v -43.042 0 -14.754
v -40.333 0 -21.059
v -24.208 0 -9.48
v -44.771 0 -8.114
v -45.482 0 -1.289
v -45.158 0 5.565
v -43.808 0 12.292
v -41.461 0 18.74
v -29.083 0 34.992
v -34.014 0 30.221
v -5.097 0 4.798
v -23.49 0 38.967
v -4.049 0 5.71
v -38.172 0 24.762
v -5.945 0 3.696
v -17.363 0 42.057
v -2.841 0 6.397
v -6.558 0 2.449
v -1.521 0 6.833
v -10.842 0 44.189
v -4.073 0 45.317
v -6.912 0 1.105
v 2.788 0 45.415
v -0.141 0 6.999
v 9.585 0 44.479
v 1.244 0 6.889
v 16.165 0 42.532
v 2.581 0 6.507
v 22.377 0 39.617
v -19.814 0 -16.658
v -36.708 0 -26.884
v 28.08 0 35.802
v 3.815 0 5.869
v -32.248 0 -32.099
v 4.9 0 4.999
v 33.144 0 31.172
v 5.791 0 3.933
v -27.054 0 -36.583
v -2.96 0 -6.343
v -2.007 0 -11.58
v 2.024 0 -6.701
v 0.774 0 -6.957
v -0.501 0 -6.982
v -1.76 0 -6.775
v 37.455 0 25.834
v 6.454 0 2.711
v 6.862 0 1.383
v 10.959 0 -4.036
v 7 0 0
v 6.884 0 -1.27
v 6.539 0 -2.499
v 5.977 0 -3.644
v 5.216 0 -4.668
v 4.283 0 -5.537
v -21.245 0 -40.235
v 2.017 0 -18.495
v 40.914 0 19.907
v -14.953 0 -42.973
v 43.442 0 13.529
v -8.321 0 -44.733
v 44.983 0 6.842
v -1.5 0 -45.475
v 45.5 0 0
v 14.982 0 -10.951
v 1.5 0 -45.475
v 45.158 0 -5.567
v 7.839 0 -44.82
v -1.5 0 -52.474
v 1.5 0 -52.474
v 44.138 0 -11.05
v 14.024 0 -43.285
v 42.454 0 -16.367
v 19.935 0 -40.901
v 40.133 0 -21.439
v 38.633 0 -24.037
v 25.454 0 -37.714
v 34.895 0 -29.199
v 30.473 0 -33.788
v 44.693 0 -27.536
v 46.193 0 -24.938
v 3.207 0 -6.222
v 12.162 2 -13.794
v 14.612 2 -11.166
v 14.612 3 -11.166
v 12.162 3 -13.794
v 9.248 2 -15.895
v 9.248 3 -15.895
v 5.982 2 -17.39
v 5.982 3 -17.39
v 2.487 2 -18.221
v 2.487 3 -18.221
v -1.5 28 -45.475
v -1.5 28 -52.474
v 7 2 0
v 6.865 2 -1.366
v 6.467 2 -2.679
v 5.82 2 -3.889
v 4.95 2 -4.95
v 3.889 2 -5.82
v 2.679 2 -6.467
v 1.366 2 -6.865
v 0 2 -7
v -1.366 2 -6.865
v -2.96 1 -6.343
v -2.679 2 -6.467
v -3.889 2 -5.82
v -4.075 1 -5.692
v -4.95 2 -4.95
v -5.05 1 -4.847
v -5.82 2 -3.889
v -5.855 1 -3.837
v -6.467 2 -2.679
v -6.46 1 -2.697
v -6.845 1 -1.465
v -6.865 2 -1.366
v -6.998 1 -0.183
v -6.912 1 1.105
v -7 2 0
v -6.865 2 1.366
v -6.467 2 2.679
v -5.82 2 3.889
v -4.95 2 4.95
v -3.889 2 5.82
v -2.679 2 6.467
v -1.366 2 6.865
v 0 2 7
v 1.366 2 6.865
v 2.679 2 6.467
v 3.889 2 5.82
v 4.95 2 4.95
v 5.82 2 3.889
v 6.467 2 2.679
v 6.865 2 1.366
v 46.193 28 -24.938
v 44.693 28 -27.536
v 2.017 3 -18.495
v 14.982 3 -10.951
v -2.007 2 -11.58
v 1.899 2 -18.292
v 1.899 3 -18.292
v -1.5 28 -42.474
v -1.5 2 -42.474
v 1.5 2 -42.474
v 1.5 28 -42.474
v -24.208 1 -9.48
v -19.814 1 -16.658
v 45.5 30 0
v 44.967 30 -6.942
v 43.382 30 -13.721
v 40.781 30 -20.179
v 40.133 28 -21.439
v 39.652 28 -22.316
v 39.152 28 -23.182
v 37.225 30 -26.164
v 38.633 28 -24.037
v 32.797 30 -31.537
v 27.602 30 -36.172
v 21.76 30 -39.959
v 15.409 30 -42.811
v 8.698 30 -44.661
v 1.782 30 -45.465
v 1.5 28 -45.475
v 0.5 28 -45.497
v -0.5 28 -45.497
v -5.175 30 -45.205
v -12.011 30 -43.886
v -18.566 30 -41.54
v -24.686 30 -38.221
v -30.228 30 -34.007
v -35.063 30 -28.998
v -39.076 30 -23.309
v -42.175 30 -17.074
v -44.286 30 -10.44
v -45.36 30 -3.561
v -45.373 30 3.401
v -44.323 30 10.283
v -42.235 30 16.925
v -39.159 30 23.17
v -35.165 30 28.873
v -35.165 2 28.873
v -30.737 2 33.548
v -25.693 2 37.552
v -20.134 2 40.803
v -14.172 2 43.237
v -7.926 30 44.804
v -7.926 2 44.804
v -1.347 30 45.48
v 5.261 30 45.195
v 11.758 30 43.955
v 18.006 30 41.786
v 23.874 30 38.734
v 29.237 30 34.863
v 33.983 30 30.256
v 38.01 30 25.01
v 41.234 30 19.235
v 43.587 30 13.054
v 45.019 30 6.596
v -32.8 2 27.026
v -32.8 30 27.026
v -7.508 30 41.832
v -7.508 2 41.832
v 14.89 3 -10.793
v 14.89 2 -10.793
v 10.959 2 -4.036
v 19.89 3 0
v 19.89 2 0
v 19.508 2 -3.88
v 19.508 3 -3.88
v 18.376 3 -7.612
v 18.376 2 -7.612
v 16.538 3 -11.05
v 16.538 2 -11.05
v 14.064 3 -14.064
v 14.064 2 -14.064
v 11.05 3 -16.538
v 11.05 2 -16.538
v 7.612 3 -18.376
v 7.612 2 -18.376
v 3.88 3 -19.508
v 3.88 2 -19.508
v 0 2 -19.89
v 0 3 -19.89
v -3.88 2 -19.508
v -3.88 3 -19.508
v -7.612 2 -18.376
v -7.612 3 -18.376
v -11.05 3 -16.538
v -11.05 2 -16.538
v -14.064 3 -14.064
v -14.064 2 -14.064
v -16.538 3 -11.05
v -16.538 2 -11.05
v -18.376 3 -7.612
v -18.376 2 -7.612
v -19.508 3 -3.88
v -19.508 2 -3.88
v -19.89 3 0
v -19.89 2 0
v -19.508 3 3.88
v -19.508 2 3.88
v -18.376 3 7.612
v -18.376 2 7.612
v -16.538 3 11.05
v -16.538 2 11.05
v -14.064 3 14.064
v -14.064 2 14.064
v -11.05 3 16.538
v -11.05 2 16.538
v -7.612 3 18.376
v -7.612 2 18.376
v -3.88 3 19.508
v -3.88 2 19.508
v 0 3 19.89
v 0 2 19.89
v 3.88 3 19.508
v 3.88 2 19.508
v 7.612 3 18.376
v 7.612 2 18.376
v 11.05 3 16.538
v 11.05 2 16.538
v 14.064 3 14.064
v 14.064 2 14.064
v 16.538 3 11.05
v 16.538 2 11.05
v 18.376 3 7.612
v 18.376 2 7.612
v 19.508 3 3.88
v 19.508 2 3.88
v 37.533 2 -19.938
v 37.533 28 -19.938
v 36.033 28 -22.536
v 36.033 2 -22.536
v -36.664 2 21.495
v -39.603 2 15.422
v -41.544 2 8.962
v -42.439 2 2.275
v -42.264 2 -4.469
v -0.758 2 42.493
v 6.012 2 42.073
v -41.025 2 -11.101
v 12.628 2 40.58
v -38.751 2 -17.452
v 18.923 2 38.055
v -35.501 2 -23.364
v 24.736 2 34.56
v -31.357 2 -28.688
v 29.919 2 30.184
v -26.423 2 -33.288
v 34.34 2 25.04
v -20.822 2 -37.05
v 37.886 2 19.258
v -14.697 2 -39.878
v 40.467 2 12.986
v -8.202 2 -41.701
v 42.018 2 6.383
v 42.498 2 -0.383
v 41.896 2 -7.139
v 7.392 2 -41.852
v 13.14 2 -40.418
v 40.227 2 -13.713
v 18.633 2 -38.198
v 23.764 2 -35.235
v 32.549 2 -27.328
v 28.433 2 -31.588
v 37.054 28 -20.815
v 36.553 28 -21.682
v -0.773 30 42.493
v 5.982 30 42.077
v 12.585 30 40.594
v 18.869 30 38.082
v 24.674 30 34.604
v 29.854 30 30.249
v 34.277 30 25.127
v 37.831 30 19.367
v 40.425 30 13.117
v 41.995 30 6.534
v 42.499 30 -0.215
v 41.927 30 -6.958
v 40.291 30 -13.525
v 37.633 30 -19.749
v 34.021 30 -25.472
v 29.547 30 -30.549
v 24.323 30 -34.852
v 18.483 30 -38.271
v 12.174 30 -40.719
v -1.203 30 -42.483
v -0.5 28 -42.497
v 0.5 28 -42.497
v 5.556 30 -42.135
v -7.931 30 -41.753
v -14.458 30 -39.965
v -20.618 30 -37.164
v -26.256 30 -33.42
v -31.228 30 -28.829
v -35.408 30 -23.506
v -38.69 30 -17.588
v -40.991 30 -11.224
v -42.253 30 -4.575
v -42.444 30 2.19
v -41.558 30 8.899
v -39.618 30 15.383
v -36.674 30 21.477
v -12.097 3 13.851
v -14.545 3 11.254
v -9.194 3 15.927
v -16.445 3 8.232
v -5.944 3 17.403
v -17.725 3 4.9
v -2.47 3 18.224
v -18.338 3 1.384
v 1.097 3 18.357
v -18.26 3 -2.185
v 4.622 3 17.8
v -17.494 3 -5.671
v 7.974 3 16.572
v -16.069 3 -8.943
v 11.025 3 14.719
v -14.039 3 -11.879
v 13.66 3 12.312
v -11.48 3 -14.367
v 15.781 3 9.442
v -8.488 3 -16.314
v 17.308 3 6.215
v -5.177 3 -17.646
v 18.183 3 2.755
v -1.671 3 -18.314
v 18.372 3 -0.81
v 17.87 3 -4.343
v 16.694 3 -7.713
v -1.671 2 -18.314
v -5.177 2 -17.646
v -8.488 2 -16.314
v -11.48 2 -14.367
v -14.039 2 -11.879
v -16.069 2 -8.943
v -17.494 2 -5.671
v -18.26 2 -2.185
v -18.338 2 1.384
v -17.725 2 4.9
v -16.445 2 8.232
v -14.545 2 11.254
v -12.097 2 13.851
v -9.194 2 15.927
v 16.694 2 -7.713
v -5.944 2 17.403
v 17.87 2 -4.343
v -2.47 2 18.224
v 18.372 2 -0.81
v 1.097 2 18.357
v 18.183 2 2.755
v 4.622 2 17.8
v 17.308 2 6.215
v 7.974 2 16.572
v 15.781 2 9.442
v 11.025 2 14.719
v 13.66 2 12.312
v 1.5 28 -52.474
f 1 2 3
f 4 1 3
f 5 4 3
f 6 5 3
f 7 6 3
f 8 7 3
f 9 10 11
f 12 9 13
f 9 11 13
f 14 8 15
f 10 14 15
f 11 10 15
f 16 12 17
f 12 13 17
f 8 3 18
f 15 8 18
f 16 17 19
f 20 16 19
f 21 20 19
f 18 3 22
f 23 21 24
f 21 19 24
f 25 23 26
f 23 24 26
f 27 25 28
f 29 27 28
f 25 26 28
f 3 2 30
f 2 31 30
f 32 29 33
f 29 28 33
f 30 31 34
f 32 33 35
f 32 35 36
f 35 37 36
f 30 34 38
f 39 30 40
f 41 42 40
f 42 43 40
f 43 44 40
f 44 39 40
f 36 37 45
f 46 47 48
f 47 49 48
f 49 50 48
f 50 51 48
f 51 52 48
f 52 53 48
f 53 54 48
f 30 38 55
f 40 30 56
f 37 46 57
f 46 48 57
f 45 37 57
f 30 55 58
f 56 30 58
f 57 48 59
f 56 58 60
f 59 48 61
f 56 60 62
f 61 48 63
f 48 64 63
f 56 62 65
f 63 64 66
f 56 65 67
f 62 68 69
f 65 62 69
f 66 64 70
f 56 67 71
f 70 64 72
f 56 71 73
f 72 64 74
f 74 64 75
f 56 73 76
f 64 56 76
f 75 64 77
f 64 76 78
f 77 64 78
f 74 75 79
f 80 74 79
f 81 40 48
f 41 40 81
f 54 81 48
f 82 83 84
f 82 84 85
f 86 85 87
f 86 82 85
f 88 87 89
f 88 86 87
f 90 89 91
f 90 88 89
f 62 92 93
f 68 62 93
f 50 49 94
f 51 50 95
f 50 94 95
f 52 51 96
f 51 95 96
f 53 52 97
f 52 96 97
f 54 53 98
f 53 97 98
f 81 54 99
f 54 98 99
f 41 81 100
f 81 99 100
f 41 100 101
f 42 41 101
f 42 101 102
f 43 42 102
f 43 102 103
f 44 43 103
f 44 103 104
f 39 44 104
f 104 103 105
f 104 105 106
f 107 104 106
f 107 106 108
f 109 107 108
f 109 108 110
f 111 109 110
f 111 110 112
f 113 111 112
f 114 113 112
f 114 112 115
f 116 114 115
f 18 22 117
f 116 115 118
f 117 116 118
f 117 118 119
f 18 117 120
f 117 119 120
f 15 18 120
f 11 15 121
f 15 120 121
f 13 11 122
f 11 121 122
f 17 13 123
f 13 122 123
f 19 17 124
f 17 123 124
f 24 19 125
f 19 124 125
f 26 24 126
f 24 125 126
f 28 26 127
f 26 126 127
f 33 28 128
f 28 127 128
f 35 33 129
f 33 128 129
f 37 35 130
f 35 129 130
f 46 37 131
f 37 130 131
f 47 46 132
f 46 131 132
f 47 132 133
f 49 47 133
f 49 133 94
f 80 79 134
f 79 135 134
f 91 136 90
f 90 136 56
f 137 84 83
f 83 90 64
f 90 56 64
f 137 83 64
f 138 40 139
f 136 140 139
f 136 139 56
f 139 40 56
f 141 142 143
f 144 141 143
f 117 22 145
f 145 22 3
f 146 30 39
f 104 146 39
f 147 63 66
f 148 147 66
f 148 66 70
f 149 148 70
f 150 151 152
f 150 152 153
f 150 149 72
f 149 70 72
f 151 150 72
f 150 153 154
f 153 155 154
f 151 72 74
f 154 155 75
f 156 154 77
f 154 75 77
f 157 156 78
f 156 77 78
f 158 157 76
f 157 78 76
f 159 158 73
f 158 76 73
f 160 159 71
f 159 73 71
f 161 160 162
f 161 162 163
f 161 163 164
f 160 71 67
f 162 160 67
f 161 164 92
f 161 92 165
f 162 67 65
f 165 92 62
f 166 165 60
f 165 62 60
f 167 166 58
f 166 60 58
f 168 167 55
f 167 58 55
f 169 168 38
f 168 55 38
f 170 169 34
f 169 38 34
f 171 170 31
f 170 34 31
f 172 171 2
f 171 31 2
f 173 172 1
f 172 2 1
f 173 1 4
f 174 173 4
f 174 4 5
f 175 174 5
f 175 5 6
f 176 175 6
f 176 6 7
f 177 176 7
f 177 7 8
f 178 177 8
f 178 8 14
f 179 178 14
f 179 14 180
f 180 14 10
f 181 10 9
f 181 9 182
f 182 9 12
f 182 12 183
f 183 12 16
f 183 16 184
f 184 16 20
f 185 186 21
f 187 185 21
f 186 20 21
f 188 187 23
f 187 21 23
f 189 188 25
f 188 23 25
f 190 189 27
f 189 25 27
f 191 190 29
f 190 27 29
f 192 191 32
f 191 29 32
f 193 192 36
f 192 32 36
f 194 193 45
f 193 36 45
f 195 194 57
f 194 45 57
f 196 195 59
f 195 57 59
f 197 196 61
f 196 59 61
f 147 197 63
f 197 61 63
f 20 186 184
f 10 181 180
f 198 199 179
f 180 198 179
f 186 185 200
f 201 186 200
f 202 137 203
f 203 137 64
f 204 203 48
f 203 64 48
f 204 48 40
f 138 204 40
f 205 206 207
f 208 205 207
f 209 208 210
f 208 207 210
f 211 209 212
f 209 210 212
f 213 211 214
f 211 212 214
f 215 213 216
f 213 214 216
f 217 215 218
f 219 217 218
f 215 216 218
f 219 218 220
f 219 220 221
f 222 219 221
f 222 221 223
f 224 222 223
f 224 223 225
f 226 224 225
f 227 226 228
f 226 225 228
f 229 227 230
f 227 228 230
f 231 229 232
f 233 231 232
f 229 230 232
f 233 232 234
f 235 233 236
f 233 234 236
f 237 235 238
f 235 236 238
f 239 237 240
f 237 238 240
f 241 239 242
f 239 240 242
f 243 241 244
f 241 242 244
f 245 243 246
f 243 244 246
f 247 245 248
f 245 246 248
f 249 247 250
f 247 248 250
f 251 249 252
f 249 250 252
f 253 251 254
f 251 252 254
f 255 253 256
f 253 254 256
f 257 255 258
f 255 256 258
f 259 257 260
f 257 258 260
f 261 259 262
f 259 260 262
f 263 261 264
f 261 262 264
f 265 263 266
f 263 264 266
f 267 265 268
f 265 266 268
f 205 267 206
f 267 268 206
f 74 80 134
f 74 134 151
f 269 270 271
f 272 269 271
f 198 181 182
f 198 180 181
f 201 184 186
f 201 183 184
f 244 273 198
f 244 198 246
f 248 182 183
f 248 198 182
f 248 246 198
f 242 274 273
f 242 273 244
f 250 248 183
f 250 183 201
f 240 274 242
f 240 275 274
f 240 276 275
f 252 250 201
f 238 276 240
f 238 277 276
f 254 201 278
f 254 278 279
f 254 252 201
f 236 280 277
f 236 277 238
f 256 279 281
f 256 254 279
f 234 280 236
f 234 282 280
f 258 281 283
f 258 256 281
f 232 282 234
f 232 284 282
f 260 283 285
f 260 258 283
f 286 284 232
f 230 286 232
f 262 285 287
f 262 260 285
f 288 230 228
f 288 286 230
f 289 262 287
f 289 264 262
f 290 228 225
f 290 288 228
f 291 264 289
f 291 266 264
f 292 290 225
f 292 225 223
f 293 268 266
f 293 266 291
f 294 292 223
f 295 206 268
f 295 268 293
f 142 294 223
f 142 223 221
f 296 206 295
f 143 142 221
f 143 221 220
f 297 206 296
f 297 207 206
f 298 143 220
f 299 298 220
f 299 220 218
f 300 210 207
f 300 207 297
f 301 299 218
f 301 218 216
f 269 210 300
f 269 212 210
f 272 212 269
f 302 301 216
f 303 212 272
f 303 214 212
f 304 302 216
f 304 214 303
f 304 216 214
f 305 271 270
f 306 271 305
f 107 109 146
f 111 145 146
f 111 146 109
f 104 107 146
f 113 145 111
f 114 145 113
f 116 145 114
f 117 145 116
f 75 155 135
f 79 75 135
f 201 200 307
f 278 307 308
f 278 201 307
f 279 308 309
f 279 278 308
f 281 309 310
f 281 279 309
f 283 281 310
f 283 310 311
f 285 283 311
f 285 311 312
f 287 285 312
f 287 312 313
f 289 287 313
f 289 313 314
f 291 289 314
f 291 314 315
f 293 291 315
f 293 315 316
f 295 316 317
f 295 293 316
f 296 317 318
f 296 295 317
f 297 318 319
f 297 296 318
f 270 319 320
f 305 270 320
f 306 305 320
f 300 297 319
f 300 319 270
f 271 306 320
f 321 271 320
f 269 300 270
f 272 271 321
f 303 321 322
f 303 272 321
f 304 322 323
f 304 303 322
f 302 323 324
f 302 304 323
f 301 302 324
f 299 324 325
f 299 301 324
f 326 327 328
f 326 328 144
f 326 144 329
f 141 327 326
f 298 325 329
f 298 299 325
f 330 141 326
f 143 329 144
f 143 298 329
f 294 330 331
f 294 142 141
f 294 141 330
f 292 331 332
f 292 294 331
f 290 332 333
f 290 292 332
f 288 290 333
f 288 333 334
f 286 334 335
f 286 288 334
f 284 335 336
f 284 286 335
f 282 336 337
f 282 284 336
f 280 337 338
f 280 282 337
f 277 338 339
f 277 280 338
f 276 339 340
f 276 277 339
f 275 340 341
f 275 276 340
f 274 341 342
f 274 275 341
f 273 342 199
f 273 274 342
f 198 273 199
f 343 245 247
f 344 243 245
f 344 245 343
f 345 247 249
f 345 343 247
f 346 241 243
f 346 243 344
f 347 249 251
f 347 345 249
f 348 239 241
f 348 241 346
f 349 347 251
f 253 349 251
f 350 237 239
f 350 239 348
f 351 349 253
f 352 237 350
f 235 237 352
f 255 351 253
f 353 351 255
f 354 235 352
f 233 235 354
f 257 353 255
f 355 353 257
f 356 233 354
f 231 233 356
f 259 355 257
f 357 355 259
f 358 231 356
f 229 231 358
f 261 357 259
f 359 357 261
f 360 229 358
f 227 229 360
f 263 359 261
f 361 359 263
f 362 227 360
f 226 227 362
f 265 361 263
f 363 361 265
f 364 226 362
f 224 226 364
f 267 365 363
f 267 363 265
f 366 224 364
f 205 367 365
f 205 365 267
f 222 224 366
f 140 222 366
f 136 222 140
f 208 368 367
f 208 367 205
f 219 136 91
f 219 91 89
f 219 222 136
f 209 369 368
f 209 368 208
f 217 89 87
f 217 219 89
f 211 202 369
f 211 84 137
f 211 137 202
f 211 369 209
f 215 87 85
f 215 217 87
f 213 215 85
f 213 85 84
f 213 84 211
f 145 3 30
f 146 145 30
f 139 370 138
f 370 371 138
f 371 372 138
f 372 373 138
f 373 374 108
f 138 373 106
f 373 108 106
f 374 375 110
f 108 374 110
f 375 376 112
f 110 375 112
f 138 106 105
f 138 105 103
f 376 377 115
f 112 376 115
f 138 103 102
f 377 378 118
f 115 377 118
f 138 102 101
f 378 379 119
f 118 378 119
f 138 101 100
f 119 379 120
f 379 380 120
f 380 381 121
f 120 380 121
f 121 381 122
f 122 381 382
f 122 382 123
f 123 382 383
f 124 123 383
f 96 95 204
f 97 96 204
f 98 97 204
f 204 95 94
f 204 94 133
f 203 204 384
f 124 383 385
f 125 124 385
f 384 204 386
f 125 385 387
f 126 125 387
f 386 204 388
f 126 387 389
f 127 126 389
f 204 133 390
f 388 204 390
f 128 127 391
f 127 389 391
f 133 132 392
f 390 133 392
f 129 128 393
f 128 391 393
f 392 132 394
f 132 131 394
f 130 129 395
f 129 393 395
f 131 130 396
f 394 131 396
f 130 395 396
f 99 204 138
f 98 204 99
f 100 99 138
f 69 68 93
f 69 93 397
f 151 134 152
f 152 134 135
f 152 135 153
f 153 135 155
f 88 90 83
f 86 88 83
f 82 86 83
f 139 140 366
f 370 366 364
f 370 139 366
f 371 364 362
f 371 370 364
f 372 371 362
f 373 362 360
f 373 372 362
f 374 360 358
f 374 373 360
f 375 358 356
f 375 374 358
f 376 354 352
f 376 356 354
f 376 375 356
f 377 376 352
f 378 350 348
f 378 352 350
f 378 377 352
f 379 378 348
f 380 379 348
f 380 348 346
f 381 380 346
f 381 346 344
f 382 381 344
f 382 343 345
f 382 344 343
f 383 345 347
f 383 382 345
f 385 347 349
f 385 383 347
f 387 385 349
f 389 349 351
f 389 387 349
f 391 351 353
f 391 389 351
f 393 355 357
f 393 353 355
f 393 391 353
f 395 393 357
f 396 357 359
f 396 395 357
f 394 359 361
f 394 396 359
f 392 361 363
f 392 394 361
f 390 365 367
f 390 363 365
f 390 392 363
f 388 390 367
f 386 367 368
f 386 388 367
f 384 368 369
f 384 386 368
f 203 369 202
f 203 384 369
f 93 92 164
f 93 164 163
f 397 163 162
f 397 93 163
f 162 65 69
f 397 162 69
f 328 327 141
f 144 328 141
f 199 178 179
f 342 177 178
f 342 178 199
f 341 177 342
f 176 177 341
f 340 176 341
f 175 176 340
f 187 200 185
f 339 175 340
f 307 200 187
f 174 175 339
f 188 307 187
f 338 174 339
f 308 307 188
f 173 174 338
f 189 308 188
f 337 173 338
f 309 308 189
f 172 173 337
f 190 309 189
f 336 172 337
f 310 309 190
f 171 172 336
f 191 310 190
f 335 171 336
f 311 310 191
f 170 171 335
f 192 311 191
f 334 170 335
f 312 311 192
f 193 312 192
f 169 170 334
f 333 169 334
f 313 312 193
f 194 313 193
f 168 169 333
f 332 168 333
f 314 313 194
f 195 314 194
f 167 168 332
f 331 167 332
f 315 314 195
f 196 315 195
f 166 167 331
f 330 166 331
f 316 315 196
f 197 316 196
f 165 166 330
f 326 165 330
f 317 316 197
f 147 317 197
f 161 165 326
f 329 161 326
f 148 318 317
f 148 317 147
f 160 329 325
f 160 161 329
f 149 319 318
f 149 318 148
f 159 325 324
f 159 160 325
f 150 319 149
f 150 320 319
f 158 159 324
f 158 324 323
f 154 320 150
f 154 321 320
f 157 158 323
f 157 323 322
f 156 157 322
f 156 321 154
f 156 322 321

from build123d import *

# Parameters (mm, degrees)
SKETCH1_R                = 45.5
SKETCH1_R_2              = 42.5
BOSS_EXTRUDE1_DEPTH      = 30
SKETCH2_R                = 45.5
BOSS_EXTRUDE2_DEPTH      = 2
SKETCH3_R                = 7
CUT_EXTRUDE1_DEPTH       = 2
SKETCH7_W                = 3
SKETCH7_H                = 10
BOSS_EXTRUDE4_DEPTH      = 26
BOSS_EXTRUDE4_DEPTH_BACK = 2
SKETCH8_R                = 19.890165718
SKETCH8_R_2              = 18.390165718
BOSS_EXTRUDE5_DEPTH      = 1
CUT_EXTRUDE4_DEPTH       = 5.5
CUT_EXTRUDE5_DEPTH       = 58.5
CUT_EXTRUDE6_DEPTH       = 1


with BuildPart() as part:
    # Sketch1 → Boss-Extrude1 (new body)
    with BuildSketch(Plane(origin=(0, 0, 0), x_dir=(1, 0, 0), z_dir=(0, 1, 0))):
        Circle(SKETCH1_R)
        Circle(SKETCH1_R_2, mode=Mode.SUBTRACT)
    extrude(amount=BOSS_EXTRUDE1_DEPTH)

    # Sketch2 → Boss-Extrude2 (add)
    with BuildSketch(Plane.XZ):
        Circle(SKETCH2_R)
    extrude(amount=-BOSS_EXTRUDE2_DEPTH)

    # Sketch3 → Cut-Extrude1 (cut)
    with BuildSketch(Plane(origin=(0, 2, 0), x_dir=(1, 0, 0), z_dir=(0, 1, 0))):
        Circle(SKETCH3_R)
    extrude(amount=-CUT_EXTRUDE1_DEPTH, mode=Mode.SUBTRACT)

    # Sketch7 → Boss-Extrude4 (add, two sides)
    with BuildSketch(Plane(origin=(0, 2, 0), x_dir=(1, 0, 0), z_dir=(0, 1, 0))) as boss_extrude4_sk:
        with Locations((0, 47.473521163)):
            Rectangle(SKETCH7_W, SKETCH7_H)
        Polygon((46.193402353, 24.937722476), (37.533148315, 19.937722476), (36.033148315, 22.535798687), (44.693402353, 27.535798687), align=None)
    extrude(amount=BOSS_EXTRUDE4_DEPTH)
    extrude(boss_extrude4_sk.sketch, amount=-BOSS_EXTRUDE4_DEPTH_BACK)

    # Sketch8 → Boss-Extrude5 (add)
    with BuildSketch(Plane(origin=(0, 2, 0), x_dir=(1, 0, 0), z_dir=(0, 1, 0))):
        Circle(SKETCH8_R)
        Circle(SKETCH8_R_2, mode=Mode.SUBTRACT)
    extrude(amount=BOSS_EXTRUDE5_DEPTH)

    # Sketch10 → Cut-Extrude4 (cut)
    with BuildSketch(Plane.XZ):
        Polygon((2.016687189, -18.494703278), (14.981867268, -10.951222284), (10.958677405, -4.036459575), (-2.006502675, -11.579940569), align=None)
    extrude(amount=-CUT_EXTRUDE4_DEPTH, mode=Mode.SUBTRACT)

    # Sketch11 → Cut-Extrude5 (cut)
    with BuildSketch(Plane(origin=(0, 2, 0), x_dir=(1, 0, 0), z_dir=(0, 1, 0))):
        Polygon((-32.606600292, -26.874098434), (-35.165226496, -28.87311631), (-33.824988888, -37.754161376), (-11.7382848, -48.772412552), (-7.925983096, -44.804338986), (-7.495155029, -41.738838001), (-9.978475631, -35.419229659), (-25.965270809, -26.874098434), align=None)
    extrude(amount=CUT_EXTRUDE5_DEPTH, mode=Mode.SUBTRACT)

    # Sketch12 → Cut-Extrude6 (cut)
    with BuildSketch(Plane.XZ):
        Polygon((-6.912265346, 1.104802147), (-24.20763883, -9.480307189), (-19.814483018, -16.658435267), (-2.519109534, -6.073325931), align=None)
    extrude(amount=-CUT_EXTRUDE6_DEPTH, mode=Mode.SUBTRACT)


solid = part.part
